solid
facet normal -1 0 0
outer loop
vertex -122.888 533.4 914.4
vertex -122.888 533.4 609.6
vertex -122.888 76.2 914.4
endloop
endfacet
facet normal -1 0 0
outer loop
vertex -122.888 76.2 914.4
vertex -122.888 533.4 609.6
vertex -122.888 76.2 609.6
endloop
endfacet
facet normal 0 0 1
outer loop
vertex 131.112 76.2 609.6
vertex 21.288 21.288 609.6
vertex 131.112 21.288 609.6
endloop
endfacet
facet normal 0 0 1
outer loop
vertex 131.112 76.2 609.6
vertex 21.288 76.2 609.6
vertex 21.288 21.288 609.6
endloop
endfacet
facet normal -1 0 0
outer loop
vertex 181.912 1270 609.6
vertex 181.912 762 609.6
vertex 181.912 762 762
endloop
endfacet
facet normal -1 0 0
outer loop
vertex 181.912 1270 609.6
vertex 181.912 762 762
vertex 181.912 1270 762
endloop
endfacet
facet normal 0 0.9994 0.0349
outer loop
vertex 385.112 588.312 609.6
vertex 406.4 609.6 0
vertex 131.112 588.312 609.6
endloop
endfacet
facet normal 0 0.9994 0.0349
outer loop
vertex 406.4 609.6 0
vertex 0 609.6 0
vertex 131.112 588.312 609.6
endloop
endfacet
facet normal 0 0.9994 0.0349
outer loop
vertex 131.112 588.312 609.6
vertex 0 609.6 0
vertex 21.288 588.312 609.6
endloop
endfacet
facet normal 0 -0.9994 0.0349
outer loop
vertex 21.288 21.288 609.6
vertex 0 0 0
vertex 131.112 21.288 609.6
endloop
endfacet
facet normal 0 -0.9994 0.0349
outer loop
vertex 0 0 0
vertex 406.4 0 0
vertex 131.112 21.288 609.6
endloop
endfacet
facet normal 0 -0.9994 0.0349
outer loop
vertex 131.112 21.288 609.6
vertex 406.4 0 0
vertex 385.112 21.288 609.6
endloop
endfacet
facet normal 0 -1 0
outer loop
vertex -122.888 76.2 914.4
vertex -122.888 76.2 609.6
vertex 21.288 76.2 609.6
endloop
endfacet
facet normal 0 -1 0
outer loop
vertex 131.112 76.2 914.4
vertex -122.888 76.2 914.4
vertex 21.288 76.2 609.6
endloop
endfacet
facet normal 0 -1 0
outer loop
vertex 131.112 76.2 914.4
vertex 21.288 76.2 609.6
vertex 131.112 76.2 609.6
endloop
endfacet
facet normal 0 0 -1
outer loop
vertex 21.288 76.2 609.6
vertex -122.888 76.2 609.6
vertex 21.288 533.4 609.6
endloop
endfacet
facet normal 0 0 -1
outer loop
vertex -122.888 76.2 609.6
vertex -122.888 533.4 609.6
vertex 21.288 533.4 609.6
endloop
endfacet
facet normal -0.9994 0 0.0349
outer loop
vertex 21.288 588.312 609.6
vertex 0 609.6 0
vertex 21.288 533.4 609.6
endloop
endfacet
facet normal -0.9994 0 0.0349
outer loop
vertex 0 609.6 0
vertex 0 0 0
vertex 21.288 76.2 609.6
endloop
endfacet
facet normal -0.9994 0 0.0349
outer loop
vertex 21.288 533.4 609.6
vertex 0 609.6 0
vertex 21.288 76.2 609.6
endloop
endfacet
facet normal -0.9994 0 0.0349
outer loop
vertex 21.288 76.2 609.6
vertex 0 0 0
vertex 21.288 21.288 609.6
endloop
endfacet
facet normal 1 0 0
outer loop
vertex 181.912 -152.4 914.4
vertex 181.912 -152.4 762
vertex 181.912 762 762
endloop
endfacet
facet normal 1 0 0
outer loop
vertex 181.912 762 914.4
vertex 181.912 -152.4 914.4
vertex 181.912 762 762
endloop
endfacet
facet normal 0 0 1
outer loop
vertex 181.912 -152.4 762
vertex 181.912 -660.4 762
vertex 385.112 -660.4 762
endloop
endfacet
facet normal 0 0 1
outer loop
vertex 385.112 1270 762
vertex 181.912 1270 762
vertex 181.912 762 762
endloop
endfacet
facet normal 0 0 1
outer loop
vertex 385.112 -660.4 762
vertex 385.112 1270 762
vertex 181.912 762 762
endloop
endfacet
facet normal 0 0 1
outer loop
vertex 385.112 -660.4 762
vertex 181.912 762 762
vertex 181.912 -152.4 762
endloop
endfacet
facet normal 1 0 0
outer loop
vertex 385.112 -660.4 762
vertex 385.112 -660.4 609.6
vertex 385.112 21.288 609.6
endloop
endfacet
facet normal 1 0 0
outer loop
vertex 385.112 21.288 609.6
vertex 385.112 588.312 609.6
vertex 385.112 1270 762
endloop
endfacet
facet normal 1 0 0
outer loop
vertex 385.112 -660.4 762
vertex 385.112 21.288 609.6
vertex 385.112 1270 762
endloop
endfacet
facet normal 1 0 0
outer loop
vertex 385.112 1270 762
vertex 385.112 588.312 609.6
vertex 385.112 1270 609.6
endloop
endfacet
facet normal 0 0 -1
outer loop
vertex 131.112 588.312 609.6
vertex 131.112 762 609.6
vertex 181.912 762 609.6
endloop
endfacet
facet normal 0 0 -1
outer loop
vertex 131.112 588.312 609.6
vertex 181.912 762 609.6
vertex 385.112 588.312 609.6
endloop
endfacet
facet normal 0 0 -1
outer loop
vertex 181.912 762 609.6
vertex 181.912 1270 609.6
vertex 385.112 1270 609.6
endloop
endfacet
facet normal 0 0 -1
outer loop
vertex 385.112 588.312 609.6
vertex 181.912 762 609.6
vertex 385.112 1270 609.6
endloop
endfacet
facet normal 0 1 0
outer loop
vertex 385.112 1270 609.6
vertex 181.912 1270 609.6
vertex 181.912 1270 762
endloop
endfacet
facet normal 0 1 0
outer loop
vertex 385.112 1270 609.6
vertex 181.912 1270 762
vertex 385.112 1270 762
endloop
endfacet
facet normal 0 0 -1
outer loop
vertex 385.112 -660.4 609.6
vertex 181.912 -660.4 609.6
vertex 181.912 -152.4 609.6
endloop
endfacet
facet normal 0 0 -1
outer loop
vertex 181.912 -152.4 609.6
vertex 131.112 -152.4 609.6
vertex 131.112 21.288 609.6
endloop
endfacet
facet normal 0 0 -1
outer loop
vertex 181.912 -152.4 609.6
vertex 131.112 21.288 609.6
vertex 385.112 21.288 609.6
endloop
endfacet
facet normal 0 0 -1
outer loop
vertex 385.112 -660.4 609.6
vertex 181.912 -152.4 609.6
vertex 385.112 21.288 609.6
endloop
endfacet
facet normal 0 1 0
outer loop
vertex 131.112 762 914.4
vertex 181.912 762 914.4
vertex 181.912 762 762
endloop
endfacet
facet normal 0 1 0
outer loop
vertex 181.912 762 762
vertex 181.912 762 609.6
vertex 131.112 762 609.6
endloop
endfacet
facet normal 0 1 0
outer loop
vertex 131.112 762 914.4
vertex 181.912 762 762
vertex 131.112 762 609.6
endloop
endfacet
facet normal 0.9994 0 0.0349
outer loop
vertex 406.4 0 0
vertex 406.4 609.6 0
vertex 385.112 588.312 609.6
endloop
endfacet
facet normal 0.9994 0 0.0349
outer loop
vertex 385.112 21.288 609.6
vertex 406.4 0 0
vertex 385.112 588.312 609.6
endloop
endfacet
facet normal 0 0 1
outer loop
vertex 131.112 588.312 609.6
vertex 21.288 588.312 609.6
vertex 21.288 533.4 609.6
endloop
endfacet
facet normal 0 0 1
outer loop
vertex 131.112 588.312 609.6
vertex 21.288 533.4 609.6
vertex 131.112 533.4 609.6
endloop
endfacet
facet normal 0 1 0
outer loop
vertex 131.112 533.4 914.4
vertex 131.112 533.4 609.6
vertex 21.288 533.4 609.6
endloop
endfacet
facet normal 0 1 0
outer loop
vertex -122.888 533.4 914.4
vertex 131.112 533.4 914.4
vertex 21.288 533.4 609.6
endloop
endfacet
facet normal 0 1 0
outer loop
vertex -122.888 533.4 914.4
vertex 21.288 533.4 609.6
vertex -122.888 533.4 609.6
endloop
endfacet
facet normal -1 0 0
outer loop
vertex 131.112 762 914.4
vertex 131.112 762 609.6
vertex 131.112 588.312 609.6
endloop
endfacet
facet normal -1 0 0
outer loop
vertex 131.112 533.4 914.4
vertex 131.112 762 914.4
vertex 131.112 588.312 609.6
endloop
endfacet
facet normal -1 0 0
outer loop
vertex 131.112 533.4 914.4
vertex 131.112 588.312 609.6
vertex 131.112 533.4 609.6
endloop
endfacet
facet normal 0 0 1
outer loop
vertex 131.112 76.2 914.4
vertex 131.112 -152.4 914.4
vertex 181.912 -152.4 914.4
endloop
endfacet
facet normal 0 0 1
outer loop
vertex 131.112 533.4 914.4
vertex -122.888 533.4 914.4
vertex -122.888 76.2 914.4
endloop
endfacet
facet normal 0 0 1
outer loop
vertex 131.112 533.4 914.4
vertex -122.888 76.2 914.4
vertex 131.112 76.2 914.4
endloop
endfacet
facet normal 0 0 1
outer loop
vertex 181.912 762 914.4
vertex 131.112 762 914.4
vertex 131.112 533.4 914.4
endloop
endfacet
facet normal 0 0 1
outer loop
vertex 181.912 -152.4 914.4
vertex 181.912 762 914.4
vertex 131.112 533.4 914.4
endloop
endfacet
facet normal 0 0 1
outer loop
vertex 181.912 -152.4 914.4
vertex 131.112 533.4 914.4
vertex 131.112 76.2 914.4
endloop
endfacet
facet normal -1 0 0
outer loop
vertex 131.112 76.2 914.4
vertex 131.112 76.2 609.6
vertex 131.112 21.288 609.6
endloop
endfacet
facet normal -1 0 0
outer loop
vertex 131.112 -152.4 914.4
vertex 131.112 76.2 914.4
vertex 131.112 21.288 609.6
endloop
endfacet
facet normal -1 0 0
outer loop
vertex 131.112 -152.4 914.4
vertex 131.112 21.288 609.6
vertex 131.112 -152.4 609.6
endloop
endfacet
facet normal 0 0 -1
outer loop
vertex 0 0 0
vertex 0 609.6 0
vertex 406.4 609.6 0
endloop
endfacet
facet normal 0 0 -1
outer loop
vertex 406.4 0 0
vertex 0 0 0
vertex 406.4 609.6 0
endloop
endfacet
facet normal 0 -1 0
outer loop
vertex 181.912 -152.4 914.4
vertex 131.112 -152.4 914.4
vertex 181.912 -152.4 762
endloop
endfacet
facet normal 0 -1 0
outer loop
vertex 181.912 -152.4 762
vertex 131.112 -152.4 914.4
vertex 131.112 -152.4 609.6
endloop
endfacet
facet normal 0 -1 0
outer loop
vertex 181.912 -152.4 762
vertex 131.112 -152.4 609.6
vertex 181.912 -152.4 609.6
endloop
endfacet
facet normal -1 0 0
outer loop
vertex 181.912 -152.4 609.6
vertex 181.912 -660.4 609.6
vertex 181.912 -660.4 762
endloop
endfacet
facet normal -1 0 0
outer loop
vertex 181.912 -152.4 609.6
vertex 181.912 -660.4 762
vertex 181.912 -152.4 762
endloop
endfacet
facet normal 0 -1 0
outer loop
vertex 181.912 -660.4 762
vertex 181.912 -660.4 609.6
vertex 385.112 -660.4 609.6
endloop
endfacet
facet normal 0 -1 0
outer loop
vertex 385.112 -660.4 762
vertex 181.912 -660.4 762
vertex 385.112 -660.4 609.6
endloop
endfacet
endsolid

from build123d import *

# Parameters (mm, degrees)
F0_W     = 406.4
F0_H     = 609.6
F1_DEPTH = 609.6
F1_TAPER = 2
F2_W     = 203.2
F2_H     = 1930.4
F3_DEPTH = 152.4
F5_DEPTH = 304.8


with BuildPart() as f1:
    # F0 (on Top) → F1 (new body)
    with BuildSketch(Plane.XY):
        with Locations((203.2, 304.8)):
            Rectangle(F0_W, F0_H)
    extrude(amount=F1_DEPTH, taper=F1_TAPER)

    # F2 (on face) → F3 (join)
    with BuildSketch(Plane.XY.offset(609.6)):
        with Locations((283.5122989178, 304.8)):
            Rectangle(F2_W, F2_H)
    extrude(amount=F3_DEPTH)

    # F4 (on face) → F5 (join)
    with BuildSketch(Plane.XY.offset(609.6)):
        Polygon((181.9122989178, -152.4), (181.9122989178, 762), (131.1122989178, 762), (131.1122989178, 533.4), (-122.8877010822, 533.4), (-122.8877010822, 76.2), (131.1122989178, 76.2), (131.1122989178, -152.4), align=None)
    extrude(amount=F5_DEPTH)


solid = f1.part
